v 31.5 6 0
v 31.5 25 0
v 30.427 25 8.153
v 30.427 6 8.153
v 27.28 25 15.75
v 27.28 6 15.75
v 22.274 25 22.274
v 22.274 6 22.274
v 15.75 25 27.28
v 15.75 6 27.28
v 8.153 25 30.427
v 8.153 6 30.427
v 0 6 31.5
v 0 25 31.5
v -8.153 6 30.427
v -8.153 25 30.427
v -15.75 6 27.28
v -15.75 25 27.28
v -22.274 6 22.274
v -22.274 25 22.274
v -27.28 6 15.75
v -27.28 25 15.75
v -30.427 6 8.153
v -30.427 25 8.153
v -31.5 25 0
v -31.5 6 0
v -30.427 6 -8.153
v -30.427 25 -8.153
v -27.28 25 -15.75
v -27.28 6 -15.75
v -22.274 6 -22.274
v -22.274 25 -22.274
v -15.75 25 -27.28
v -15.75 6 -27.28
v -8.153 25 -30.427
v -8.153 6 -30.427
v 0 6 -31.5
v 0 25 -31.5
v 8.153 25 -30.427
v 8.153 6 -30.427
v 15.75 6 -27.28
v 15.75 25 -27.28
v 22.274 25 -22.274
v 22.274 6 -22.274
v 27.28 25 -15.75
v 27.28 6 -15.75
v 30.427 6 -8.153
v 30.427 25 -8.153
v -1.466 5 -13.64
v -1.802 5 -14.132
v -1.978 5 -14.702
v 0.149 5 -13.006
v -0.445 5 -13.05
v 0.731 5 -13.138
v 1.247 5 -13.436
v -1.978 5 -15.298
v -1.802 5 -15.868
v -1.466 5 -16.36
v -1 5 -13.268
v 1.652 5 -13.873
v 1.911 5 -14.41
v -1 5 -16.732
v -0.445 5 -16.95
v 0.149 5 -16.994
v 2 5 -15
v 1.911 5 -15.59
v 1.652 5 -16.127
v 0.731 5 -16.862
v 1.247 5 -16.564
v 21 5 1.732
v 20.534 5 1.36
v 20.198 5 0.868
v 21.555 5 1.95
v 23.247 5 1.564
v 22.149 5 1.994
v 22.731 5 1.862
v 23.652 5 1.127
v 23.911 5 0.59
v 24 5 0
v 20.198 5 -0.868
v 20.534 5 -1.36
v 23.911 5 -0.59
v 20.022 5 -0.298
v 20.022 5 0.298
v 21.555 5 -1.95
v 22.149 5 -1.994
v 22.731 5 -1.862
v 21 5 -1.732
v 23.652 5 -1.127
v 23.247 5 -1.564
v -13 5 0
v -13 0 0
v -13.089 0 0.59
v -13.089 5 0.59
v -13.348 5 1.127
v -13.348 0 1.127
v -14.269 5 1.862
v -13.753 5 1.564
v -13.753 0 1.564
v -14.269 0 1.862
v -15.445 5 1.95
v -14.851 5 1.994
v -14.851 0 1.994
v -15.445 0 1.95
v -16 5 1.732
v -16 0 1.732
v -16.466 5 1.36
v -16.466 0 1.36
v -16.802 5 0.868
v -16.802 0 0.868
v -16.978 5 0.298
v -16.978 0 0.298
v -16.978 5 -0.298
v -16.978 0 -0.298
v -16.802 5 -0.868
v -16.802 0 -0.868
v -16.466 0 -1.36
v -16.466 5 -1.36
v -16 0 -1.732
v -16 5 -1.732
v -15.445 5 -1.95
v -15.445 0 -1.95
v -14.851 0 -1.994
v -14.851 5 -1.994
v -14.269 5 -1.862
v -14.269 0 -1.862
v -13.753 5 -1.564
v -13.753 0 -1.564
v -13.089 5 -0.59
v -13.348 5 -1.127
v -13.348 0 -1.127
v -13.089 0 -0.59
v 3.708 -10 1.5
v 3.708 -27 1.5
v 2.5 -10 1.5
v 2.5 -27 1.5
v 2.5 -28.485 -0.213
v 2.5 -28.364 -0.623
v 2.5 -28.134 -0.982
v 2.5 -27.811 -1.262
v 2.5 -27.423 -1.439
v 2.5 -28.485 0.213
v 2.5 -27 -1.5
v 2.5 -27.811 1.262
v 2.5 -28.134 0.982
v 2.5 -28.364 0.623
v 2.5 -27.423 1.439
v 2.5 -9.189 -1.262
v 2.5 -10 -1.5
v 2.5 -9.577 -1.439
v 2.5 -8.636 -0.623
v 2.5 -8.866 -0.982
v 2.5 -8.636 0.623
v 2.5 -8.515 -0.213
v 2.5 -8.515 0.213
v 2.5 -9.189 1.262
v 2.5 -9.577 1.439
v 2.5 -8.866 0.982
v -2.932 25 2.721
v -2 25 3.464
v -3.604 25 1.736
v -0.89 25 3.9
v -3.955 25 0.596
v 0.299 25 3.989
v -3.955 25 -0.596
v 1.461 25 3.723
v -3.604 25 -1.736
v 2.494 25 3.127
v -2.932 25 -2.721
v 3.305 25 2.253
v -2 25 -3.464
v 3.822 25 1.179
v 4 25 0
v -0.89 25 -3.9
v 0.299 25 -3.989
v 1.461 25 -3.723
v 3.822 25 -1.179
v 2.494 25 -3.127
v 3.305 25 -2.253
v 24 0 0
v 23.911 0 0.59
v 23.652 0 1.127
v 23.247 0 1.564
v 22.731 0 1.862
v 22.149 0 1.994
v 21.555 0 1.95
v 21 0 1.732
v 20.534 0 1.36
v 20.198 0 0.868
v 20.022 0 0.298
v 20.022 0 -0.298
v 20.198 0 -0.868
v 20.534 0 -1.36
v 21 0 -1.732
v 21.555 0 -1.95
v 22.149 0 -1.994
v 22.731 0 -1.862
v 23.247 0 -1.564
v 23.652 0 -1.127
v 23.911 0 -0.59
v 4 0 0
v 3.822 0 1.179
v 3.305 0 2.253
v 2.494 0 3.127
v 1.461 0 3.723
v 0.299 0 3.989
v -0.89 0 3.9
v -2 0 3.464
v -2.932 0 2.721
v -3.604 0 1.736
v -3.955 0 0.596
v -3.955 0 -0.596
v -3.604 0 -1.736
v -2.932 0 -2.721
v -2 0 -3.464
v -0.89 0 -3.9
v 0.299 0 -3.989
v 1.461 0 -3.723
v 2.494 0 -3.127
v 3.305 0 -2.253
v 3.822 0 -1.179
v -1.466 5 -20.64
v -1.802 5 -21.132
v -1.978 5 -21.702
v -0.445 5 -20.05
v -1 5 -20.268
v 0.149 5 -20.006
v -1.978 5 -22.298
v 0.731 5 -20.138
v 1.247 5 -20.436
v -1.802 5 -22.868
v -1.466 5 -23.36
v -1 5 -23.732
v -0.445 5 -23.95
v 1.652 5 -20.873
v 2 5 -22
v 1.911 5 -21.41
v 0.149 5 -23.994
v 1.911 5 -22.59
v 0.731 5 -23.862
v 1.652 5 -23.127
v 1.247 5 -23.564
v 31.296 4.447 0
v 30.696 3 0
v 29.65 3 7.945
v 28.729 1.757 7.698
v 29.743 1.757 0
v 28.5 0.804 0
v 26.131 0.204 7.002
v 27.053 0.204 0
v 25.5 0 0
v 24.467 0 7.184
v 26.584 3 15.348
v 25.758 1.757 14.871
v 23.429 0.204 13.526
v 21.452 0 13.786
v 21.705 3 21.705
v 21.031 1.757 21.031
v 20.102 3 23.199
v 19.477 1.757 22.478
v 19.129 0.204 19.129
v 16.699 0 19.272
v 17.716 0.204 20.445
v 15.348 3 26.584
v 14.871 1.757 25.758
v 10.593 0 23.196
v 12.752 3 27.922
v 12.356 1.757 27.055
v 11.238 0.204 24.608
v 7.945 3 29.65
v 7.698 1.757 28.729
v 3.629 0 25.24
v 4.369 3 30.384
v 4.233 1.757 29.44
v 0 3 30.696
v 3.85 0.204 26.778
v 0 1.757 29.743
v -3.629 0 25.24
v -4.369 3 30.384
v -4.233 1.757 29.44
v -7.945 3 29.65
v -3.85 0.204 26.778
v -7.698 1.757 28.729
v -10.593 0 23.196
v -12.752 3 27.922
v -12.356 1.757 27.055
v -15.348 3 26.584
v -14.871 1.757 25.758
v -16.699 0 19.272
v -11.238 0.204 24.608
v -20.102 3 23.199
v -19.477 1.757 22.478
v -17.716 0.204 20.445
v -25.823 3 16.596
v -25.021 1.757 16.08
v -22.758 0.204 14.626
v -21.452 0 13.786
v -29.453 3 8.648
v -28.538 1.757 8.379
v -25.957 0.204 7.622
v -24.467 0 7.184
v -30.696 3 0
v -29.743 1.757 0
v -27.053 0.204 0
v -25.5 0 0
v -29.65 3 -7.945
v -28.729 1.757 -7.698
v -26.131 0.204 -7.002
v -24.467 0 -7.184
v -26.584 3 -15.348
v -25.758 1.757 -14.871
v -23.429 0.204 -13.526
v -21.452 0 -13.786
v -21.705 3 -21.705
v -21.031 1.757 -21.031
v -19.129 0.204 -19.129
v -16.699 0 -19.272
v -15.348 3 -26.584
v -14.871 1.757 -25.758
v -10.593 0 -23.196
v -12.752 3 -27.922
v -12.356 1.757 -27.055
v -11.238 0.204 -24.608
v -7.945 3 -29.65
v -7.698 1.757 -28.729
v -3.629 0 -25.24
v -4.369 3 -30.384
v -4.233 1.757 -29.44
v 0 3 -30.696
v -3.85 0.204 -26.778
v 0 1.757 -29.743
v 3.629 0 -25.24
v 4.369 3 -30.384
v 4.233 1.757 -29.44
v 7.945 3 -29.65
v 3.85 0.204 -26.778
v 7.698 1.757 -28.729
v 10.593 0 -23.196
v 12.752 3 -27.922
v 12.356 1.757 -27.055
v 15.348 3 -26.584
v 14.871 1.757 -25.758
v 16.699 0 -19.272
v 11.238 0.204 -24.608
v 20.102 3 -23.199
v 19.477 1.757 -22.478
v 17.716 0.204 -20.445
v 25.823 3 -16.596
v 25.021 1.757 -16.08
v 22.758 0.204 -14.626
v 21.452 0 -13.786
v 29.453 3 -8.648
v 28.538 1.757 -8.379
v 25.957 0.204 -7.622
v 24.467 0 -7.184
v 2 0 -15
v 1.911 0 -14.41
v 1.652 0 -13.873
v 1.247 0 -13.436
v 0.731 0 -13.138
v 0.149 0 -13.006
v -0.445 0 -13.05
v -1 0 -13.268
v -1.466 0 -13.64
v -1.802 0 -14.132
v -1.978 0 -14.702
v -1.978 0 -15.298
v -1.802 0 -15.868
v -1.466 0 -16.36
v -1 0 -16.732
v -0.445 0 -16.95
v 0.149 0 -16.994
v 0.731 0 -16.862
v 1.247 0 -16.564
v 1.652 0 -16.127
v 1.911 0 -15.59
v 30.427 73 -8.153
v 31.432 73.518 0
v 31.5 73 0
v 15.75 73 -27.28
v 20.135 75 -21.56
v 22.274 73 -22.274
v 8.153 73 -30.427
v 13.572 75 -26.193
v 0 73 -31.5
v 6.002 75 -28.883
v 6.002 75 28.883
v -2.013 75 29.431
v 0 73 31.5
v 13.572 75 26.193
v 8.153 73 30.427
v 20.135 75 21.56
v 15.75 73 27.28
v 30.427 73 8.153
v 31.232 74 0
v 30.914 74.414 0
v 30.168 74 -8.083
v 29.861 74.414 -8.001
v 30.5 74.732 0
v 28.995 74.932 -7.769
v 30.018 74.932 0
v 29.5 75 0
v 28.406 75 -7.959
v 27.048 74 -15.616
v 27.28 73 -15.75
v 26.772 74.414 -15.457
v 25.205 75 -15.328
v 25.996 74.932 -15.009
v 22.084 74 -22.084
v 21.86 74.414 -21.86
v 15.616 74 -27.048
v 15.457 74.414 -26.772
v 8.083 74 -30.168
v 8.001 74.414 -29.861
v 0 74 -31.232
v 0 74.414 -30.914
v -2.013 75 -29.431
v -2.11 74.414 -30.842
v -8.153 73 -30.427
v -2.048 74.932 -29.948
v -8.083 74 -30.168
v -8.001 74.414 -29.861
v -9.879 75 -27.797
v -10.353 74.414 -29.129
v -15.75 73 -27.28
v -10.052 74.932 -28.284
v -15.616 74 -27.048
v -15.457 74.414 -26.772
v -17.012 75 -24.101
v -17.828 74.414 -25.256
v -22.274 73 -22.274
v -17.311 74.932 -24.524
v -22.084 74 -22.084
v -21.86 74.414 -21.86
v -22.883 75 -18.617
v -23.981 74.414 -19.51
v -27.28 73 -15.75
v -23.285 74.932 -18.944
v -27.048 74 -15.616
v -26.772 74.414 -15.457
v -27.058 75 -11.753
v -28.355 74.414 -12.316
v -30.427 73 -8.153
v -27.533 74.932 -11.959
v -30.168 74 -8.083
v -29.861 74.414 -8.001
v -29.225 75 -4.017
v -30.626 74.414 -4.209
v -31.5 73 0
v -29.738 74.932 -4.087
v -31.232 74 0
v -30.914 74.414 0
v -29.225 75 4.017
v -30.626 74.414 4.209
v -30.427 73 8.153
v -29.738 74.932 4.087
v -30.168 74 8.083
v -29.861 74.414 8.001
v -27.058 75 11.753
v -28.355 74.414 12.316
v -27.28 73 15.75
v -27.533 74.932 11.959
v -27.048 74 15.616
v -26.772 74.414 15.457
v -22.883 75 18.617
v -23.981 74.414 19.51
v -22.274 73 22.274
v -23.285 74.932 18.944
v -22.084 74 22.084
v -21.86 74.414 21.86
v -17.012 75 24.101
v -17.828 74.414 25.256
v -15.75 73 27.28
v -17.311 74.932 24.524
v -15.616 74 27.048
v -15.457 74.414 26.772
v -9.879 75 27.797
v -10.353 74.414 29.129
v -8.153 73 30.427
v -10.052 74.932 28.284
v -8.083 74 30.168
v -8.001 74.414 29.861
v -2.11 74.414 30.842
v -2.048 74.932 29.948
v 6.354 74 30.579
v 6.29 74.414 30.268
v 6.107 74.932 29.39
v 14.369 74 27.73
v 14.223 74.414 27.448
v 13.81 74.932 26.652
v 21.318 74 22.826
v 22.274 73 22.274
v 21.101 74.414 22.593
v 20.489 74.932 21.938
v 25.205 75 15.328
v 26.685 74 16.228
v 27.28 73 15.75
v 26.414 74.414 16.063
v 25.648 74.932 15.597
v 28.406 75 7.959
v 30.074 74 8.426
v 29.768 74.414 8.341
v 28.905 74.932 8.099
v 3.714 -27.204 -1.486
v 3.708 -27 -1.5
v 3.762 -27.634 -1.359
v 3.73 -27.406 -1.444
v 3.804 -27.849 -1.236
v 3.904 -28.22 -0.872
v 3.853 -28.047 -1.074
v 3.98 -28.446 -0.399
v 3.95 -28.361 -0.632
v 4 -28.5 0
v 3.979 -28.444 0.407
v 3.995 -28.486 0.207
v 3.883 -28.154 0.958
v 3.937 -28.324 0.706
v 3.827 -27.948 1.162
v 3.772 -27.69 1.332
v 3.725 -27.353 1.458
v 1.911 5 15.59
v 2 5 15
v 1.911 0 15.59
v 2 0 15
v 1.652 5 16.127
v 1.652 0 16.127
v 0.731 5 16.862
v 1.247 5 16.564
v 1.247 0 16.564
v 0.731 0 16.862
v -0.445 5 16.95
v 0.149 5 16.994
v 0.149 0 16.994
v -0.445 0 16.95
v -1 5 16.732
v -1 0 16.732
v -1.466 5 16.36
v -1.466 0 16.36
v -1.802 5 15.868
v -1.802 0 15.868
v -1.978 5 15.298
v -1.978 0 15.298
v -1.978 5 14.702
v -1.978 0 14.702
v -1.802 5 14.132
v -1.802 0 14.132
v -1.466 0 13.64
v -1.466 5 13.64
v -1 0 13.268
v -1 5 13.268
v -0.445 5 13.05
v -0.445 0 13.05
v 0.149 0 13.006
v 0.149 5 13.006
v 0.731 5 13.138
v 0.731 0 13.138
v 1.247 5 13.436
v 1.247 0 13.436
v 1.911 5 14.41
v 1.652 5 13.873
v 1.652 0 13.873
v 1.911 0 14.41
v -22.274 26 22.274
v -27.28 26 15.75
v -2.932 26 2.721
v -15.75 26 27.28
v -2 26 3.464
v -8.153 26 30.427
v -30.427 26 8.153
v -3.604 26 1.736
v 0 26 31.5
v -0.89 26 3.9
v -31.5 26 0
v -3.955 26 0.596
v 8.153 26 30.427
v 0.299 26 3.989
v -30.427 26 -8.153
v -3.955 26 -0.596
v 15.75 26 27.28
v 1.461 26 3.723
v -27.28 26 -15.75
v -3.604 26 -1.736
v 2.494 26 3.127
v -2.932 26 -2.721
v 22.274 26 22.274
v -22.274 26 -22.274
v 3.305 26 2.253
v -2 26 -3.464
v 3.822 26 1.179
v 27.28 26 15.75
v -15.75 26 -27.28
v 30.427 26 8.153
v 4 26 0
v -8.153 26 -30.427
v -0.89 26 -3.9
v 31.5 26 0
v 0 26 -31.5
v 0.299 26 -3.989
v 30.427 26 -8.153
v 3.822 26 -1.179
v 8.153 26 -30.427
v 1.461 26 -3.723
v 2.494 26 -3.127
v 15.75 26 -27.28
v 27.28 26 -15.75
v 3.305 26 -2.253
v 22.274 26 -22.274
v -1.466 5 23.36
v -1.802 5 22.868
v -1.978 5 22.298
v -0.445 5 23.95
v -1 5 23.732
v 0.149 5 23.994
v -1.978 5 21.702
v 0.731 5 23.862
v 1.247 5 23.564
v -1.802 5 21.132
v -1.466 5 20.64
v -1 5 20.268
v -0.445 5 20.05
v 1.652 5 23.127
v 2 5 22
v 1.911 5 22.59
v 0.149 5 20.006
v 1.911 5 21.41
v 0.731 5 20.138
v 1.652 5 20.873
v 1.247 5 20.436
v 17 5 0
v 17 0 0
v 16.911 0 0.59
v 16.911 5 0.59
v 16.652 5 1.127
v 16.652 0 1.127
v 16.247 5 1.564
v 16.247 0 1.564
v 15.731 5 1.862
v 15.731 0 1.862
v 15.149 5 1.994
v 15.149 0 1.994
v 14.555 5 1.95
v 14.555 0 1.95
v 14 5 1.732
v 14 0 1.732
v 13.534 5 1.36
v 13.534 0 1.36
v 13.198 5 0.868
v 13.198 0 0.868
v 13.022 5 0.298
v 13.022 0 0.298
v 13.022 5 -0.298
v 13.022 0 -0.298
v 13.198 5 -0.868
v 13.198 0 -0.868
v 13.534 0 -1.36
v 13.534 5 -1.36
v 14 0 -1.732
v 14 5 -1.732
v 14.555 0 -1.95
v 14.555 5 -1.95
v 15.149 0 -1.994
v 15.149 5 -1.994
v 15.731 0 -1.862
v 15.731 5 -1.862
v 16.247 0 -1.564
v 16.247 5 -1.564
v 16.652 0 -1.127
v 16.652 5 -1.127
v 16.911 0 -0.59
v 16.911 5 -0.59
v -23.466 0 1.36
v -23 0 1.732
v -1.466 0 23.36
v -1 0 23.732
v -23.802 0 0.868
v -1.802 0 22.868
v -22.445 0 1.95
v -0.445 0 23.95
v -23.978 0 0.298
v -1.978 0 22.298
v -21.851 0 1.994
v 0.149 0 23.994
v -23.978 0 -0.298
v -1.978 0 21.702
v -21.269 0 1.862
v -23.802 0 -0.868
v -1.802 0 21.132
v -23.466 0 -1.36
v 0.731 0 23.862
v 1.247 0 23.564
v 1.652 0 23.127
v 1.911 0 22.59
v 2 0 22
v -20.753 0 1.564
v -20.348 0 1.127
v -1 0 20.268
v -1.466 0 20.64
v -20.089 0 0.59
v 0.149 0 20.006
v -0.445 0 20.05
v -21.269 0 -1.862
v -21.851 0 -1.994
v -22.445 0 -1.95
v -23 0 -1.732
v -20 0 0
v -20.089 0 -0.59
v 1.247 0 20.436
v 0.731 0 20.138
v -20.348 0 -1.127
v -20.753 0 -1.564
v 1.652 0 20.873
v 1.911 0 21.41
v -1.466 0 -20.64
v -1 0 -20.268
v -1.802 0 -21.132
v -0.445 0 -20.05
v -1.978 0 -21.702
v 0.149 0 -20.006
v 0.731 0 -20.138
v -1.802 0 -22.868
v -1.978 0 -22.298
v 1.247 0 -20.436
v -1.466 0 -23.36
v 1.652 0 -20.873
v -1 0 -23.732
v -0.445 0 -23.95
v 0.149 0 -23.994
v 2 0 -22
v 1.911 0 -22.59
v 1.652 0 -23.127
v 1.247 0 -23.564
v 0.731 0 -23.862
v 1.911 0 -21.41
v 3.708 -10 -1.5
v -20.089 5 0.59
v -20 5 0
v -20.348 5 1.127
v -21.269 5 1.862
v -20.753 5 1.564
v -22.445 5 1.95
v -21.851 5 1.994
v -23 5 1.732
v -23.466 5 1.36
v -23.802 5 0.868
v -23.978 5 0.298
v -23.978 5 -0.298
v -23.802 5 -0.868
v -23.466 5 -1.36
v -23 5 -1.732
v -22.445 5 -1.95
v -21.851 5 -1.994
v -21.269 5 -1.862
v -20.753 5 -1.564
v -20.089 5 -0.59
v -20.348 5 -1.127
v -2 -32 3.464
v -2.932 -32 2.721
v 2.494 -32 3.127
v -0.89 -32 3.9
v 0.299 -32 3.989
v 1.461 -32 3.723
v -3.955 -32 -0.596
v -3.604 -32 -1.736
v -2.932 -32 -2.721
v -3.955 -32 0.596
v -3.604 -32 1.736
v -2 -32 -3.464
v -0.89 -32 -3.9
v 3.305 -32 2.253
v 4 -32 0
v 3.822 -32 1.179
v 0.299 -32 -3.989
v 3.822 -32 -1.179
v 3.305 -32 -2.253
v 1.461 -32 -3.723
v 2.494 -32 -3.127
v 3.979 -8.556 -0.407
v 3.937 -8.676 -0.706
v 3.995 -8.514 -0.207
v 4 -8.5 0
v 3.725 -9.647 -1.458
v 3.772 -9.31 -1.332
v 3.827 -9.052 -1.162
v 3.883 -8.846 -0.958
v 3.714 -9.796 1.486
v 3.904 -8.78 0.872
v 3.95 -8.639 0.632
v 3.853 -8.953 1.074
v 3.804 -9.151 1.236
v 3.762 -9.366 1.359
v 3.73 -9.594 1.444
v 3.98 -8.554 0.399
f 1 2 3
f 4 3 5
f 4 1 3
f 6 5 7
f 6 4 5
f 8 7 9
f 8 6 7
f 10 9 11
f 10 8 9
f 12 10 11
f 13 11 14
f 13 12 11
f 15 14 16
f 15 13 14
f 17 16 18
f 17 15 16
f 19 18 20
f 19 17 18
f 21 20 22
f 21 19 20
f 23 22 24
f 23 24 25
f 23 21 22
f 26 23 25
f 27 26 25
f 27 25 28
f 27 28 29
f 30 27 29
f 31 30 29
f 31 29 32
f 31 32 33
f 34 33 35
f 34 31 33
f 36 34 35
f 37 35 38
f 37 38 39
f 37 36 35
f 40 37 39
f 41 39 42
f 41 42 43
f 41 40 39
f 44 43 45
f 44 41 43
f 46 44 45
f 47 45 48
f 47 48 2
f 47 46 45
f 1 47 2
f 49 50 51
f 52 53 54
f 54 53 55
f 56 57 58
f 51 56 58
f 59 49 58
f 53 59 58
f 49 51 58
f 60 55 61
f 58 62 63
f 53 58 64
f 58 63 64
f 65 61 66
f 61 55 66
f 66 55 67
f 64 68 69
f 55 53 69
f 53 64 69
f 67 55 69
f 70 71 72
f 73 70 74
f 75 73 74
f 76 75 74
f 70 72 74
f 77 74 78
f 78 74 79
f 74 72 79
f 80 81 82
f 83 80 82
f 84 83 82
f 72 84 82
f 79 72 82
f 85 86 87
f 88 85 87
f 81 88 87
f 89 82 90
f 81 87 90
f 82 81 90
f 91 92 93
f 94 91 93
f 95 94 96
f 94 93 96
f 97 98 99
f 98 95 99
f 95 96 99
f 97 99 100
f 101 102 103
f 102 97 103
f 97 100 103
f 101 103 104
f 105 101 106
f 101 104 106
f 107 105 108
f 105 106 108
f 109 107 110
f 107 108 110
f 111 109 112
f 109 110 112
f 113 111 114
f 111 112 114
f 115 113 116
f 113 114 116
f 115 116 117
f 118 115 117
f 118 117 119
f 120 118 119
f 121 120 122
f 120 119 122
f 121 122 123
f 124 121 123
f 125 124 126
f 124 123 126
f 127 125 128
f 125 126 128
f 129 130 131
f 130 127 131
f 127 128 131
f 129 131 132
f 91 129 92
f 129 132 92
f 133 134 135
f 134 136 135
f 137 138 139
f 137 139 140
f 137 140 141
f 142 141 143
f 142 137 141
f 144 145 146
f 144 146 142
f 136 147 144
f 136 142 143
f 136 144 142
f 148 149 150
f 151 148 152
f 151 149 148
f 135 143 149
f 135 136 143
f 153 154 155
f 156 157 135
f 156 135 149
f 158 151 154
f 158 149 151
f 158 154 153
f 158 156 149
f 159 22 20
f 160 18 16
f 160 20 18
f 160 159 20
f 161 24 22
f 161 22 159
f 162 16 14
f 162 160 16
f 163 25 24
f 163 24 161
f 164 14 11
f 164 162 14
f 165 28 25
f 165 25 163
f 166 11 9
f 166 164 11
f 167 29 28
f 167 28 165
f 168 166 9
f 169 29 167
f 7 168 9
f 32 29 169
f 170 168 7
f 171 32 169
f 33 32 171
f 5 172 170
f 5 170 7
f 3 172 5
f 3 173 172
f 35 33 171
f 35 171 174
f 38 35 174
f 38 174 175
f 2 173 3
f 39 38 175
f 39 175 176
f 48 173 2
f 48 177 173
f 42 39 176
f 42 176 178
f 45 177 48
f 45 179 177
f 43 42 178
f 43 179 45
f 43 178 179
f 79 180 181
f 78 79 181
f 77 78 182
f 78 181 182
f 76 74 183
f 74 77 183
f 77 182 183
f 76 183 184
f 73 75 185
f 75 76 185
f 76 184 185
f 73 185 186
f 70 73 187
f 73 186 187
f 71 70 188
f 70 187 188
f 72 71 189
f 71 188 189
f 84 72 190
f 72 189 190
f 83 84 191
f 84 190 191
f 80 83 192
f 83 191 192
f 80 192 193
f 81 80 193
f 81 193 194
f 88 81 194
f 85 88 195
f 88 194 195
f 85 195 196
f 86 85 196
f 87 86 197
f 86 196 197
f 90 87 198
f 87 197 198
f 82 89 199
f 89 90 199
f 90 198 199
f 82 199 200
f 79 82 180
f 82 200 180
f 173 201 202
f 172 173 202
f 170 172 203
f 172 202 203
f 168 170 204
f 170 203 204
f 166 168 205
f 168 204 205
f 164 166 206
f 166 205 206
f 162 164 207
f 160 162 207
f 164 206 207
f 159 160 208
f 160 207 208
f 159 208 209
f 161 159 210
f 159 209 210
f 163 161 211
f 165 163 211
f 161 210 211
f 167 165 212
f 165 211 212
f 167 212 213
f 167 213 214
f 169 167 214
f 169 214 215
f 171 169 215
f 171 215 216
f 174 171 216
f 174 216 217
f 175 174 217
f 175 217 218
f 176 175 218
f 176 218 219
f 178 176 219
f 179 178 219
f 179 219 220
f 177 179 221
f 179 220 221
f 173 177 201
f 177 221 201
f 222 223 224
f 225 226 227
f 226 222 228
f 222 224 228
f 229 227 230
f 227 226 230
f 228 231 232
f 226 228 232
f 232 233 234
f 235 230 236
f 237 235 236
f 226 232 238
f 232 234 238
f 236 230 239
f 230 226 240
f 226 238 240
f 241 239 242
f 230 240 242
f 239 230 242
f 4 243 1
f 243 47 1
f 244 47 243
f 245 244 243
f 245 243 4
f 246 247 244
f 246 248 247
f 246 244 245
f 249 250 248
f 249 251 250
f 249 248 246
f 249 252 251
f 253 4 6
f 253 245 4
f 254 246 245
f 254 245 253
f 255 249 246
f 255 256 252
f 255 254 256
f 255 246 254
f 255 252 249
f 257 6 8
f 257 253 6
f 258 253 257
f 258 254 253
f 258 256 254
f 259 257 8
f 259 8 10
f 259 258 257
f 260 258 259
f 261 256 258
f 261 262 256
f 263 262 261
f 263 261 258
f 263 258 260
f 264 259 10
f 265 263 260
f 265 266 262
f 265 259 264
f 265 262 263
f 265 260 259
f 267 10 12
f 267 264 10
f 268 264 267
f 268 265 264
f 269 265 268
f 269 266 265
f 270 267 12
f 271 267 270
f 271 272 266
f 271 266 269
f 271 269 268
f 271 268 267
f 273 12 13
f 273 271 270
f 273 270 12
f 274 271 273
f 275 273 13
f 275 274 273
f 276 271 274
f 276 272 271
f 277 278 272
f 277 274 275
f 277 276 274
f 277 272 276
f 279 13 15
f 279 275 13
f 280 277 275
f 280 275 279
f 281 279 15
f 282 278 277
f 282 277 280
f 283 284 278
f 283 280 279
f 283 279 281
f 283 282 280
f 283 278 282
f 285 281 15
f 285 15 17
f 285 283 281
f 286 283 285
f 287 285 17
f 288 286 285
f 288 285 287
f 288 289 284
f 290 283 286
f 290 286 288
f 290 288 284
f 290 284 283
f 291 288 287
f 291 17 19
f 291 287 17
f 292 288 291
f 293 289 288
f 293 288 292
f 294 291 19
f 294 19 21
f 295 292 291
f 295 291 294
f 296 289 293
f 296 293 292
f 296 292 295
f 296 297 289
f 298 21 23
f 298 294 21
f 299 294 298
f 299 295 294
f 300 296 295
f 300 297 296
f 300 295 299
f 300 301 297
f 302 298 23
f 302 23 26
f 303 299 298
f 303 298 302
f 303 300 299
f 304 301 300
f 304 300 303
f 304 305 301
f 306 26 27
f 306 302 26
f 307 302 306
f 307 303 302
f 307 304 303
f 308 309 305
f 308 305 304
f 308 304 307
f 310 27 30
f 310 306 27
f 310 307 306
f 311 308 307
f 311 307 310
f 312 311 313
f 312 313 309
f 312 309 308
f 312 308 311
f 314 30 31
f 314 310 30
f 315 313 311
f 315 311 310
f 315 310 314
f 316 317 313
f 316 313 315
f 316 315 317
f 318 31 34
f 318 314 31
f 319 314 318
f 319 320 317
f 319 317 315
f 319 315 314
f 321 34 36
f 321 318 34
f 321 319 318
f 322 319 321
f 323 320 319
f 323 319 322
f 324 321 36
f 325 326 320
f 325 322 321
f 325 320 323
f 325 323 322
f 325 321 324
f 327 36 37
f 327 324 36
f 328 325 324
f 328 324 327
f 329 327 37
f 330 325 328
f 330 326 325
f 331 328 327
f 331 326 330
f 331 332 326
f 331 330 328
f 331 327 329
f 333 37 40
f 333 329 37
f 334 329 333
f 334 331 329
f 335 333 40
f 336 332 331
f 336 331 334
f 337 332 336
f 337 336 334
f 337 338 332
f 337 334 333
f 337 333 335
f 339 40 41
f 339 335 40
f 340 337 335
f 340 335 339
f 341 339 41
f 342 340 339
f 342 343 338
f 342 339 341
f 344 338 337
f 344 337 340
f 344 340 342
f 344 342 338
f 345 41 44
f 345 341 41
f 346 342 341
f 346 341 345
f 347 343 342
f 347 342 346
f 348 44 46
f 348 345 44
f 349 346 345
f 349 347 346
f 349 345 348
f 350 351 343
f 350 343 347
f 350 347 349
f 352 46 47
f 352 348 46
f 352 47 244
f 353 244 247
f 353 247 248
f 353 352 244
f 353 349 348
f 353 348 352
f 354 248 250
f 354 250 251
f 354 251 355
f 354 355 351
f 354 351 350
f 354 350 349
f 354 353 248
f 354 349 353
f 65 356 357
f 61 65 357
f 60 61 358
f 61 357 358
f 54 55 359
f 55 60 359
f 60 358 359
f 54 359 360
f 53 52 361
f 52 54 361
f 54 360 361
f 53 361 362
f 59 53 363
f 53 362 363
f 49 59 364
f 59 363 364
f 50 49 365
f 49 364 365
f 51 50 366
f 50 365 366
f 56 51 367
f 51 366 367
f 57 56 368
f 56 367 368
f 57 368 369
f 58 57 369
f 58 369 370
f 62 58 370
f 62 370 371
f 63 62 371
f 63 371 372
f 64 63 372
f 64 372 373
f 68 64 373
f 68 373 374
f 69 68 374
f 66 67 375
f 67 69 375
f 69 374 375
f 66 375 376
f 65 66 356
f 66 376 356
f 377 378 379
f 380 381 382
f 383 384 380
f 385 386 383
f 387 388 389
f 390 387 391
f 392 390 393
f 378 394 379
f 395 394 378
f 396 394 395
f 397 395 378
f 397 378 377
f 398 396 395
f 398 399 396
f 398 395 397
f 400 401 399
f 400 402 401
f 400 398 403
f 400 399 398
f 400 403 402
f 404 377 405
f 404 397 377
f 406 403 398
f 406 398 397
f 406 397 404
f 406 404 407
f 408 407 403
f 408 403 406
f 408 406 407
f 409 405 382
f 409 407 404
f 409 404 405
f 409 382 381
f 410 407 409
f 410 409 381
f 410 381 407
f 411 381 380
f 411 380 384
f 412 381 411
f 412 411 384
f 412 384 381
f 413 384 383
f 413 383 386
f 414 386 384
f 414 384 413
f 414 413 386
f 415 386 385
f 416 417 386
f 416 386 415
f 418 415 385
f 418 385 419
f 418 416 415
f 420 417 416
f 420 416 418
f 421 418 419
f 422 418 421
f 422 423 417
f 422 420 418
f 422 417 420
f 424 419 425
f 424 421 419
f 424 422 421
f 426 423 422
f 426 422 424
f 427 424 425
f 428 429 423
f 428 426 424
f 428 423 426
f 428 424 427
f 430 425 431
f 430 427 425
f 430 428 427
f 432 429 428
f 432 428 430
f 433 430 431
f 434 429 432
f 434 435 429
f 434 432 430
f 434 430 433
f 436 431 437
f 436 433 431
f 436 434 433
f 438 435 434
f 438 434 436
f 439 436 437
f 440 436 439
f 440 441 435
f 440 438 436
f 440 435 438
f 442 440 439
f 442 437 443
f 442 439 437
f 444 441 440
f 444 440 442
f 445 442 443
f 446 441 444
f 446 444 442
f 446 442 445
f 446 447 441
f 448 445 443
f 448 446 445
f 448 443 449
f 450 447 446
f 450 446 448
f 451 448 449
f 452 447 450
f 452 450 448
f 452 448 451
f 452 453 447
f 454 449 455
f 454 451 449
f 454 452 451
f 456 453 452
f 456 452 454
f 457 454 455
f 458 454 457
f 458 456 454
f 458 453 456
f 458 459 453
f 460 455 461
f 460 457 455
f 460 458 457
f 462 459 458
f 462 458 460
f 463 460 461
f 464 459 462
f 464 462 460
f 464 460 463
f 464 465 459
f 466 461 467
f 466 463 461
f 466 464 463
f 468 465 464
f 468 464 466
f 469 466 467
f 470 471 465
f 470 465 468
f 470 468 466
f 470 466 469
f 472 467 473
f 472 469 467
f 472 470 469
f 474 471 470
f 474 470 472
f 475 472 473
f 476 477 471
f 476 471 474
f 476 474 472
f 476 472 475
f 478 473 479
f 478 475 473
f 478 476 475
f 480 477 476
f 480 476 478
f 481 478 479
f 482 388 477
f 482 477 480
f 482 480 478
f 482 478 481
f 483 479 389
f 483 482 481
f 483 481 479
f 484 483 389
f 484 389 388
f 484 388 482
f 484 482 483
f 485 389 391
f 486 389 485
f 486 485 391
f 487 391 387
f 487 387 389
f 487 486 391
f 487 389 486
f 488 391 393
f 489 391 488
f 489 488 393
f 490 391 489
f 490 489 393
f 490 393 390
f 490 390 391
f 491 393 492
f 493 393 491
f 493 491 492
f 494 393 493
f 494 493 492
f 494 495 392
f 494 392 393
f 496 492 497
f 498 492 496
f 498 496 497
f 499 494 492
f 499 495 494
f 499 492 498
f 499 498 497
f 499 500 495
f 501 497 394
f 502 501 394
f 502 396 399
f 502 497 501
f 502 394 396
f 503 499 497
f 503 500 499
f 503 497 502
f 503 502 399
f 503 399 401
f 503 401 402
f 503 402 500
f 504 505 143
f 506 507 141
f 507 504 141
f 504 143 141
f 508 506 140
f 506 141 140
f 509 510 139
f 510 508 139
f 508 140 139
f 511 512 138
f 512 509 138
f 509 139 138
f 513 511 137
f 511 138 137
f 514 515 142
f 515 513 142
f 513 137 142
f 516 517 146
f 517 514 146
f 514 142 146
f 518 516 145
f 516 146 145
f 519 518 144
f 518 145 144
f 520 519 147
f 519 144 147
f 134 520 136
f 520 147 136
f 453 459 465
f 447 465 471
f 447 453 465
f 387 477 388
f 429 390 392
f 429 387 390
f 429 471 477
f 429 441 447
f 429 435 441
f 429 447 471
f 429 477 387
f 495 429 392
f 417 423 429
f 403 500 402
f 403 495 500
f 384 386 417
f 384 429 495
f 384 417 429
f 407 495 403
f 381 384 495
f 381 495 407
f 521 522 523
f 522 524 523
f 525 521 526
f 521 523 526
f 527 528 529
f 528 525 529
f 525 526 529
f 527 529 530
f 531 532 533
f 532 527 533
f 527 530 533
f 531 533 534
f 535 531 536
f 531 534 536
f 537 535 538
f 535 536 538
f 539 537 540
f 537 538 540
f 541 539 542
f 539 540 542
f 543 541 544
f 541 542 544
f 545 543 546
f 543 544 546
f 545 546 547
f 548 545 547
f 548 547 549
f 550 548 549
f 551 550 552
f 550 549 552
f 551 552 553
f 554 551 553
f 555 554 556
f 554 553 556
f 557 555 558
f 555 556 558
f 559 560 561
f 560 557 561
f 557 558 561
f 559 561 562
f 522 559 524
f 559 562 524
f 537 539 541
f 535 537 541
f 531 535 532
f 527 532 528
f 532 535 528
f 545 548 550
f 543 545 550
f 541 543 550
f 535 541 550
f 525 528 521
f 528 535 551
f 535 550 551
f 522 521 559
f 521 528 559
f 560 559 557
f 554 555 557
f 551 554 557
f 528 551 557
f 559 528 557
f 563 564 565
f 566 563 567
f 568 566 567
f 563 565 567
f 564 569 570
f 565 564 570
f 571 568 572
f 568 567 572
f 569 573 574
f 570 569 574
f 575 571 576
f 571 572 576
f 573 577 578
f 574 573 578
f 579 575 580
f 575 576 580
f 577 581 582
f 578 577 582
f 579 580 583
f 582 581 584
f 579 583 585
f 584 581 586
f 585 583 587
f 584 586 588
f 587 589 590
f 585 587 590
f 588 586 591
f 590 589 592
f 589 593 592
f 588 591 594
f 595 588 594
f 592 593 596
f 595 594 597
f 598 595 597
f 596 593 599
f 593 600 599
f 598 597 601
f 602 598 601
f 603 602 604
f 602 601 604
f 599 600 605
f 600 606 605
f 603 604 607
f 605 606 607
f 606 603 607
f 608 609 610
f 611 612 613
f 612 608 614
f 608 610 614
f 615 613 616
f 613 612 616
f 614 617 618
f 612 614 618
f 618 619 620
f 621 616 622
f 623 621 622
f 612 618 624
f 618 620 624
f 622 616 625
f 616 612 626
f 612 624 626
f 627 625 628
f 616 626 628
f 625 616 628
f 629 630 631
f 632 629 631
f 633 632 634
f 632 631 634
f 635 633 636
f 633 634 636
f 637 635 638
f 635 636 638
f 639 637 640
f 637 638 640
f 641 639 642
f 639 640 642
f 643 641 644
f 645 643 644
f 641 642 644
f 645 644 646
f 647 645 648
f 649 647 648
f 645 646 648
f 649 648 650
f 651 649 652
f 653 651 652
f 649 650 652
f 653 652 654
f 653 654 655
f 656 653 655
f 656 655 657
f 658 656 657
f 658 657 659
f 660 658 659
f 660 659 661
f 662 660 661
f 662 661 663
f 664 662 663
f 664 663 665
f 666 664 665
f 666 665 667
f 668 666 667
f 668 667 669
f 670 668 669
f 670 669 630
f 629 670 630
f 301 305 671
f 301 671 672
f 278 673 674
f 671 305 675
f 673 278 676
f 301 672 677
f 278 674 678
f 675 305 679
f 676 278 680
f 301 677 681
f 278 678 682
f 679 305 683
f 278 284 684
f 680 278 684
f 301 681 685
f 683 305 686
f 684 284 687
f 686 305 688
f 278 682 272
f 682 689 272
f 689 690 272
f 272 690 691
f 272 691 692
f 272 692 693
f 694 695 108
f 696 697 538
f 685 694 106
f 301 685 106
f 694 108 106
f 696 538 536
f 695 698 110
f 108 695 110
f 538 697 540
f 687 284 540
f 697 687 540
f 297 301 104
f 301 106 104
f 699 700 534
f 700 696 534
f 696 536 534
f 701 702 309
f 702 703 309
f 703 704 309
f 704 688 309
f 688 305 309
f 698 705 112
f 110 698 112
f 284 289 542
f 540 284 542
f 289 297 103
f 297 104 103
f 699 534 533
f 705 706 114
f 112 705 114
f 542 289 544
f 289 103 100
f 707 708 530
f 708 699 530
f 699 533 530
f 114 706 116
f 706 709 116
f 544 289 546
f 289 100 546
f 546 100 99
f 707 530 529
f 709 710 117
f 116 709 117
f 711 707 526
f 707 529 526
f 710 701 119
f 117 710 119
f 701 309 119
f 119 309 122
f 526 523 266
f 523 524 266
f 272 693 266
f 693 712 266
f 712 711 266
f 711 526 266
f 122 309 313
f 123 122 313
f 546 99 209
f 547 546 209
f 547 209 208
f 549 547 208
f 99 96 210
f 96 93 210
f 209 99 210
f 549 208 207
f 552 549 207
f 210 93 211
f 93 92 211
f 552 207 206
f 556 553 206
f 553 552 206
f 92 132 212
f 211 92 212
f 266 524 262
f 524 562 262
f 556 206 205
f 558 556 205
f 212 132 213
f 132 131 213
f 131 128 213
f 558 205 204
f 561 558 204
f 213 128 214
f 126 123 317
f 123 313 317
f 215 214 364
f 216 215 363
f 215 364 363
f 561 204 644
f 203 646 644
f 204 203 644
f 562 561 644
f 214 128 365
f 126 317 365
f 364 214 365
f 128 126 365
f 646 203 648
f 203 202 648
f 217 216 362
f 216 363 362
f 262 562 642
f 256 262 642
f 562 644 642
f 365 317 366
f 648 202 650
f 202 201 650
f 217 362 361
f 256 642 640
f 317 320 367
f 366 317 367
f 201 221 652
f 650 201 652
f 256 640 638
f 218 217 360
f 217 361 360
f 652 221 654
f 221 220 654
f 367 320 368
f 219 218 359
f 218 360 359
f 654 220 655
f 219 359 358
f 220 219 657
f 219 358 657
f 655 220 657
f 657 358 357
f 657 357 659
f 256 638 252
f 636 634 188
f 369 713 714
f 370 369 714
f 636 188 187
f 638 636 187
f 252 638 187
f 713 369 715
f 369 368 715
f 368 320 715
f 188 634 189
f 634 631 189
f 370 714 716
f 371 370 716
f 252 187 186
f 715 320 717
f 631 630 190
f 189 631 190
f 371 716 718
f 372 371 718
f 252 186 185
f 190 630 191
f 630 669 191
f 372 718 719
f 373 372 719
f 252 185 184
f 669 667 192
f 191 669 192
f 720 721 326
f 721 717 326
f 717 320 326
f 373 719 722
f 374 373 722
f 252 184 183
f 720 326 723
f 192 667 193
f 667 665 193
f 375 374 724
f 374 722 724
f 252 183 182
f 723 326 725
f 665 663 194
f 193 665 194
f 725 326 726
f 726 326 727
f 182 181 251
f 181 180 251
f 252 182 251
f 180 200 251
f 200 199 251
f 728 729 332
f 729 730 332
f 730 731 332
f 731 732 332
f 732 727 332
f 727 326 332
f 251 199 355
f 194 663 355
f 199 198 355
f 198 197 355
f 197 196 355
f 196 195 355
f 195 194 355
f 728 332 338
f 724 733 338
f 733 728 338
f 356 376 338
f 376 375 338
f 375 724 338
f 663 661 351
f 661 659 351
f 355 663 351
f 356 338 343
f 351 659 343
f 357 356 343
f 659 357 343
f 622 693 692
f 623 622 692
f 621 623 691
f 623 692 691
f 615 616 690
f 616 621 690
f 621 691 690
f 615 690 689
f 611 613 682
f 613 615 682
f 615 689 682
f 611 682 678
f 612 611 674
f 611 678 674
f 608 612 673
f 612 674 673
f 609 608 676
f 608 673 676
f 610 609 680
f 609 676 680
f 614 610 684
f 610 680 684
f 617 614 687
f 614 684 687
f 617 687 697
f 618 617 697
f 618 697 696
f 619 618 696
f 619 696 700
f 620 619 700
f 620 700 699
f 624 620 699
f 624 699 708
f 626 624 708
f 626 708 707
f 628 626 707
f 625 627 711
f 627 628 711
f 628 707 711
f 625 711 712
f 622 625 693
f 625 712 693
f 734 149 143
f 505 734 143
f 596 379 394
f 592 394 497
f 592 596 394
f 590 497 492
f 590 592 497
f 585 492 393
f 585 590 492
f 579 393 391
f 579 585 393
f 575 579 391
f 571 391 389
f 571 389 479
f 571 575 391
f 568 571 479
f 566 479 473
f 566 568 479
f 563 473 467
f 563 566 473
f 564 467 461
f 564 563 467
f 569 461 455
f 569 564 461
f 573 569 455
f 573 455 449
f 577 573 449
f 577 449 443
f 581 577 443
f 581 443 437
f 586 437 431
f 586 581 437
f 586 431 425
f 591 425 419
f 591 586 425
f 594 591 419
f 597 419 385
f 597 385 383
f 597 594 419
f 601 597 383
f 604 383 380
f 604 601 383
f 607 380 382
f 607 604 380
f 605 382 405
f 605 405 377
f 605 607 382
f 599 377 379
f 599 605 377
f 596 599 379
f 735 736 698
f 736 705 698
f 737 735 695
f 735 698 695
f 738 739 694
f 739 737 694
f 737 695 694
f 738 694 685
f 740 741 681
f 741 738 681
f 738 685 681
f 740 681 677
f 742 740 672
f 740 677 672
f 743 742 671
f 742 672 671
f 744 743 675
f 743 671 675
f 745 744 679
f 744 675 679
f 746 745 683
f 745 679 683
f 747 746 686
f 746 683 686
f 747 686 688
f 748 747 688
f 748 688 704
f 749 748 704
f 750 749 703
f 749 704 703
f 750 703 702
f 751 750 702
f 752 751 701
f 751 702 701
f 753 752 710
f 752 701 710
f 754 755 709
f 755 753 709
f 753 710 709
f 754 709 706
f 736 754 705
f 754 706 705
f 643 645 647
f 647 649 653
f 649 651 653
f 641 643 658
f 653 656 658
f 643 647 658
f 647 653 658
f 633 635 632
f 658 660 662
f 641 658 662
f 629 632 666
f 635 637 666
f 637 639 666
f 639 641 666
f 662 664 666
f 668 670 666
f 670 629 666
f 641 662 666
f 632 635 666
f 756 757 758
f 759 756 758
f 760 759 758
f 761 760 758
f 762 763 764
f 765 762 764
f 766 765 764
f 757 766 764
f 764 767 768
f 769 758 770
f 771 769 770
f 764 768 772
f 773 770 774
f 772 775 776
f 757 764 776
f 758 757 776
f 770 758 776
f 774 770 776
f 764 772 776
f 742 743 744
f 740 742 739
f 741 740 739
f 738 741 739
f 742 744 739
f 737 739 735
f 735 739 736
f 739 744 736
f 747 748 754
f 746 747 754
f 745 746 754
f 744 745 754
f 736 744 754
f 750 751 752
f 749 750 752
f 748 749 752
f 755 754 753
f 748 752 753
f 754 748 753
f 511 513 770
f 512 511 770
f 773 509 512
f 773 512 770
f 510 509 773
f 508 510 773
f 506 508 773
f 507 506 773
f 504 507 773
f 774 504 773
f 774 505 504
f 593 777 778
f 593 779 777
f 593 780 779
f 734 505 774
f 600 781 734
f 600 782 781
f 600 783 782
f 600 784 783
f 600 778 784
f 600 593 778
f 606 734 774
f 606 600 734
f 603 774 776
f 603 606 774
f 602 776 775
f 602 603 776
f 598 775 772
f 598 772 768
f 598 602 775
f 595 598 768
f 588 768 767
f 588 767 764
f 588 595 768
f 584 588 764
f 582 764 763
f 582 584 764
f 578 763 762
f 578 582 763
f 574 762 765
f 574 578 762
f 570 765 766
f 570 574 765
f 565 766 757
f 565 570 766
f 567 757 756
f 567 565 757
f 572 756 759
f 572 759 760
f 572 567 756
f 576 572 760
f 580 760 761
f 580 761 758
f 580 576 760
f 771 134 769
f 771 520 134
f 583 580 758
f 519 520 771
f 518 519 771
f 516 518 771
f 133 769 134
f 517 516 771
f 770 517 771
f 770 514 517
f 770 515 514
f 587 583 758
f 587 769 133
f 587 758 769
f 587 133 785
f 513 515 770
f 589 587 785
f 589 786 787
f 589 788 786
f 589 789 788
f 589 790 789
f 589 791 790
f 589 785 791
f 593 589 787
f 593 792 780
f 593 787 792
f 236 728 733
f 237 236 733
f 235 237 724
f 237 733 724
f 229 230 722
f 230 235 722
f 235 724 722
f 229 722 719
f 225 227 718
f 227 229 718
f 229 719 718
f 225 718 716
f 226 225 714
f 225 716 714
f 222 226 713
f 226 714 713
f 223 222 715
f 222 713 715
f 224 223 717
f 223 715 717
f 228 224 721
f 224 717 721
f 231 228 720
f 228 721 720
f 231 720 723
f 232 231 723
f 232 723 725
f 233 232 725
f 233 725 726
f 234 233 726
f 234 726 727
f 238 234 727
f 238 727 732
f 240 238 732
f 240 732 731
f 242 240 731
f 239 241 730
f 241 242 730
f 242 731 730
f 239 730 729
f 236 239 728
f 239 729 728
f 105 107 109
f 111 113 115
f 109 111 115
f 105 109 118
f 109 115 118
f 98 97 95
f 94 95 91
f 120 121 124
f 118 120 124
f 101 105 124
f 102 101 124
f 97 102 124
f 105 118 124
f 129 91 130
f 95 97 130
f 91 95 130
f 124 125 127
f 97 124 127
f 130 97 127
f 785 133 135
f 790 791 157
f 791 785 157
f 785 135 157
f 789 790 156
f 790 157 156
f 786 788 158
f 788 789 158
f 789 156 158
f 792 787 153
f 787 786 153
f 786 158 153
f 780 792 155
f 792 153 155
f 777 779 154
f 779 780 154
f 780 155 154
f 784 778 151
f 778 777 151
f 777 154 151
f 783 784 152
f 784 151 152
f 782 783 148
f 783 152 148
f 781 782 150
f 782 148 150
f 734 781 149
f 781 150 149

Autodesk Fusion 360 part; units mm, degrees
sketch "FlipskyFrontSketch" plane through (0, 0, 0) normal (0, 1, 0) x (1, 0, 0) in component "FlipskyR6374"
  circle A0 centre (0, 0) radius 22 construction
  circle A1 centre (0, 0) radius 31.5
  circle A2 centre (0, 0) radius 15 construction
  circle A3 centre (0, 0) radius 4
  line L0 (0, -40.5211) -> (0, 42) construction
  line L1 (-68.5254, 0) -> (76.0881, 0) construction
  circle A4 centre (0, -22) radius 2
  circle A5 centre (0, -15) radius 2
  circle A6 centre (0, 22) radius 2
  circle A7 centre (0, 15) radius 2
  circle A8 centre (-15, 0) radius 2
  circle A9 centre (-22, 0) radius 2
  circle A10 centre (15, 0) radius 2
  circle A11 centre (22, 0) radius 2
  line L2 (3.7081, -1.5) -> (2.5, -1.5)
  line L3 (2.5, -1.5) -> (2.5, 1.5)
  line L4 (2.5, 1.5) -> (3.7081, 1.5)
  line L5 (60, 20) -> (60, -20)
  line L6 (-60, -20) -> (-60, 20)
  line L7 (-60, 20) -> (60, -20) construction
  line L8 (60, 20) -> (-60, -20) construction
  line L9 (-28.1114, -20) -> (-60, -20)
  line L10 (60, -20) -> (28.1114, -20)
  line L11 (-60, 20) -> (-28.1114, 20)
  line L12 (28.1114, 20) -> (60, 20)
  circle A12 centre (-50, -10) radius 2.5
  circle A13 centre (-50, 10) radius 2.5
  circle A14 centre (50, -10) radius 2.5
  circle A15 centre (50, 10) radius 2.5
  line L13 (-63.5493, -10) -> (64.0522, -10) construction
  line L14 (-62.7711, 10) -> (65, 10) construction
  line L15 (-50, -26.3815) -> (-50, 24.1685) construction
  line L16 (50, -27.289) -> (50, 25) construction
  line L17 (16.7321, 1) -> (14.9666, 1)
  line L18 (2.5, -1) -> (3, -1)
  line L19 (-40, -20) -> (-40, 20)
  line L20 (40, -20) -> (40, 20)
  arc A16 (-28.1114, -20) -> (28.1114, -20) centre (0, 0) ccw
  arc A17 (28.1114, 20) -> (-28.1114, 20) centre (0, 0) ccw
  circle A18 centre (0, 0) radius 10
  circle A19 centre (0, 0) radius 5
  line L21 (0, 0) -> (-31.8198, -31.8198) construction
  line L22 (0, 0) -> (45, 0) construction
  line L23 (-16.2768, -30.419) -> (-14.0506, -28.1927)
  line L24 (-34.1421, -20) -> (-28.1927, -14.0506)
  dimension "d1" = 44
  dimension "d2" = 63
  dimension "d3" = 30
  dimension "d4" = 8
  dimension "d6" = 4
  dimension "d7" = 4
  dimension "d8" = 4
  dimension "d9" = 4
  dimension "d10" = 4
  dimension "d11" = 4
  dimension "d12" = 4
  dimension "d13" = 4
  dimension "d28" = 1.5
  dimension "d29" = 1.5
  dimension "d30" = 2.5
  dimension "d35" = 120
  dimension "d36" = 40
  dimension "d48" = 5
  dimension "d49" = 5
  dimension "d50" = 5
  dimension "d51" = 5
  dimension "d52" = 10
  dimension "d53" = 10
  dimension "d54" = 10
  dimension "d55" = 10
  dimension "d66" = 20
  dimension "d67" = 20
  dimension "d68" = 34.5
  dimension "d71" = 20
  dimension "d72" = 10
  dimension "d73" = 135
  dimension "d75" = 10
  dimension "d76" = 10
extrude "Extrude1" add sketch "FlipskyFrontSketch" along normal blind 25 contours A1 | A4 | A5 | A6 | A7 | A8 | A9 | A10 | A11 | A18 | A19 makes body 1 in component "Stator"
extrude "Extrude2" cut sketch "FlipskyFrontSketch" along normal blind 5 contours A4 | A5 | A6 | A7 | A8 | A9 | A10 | A11 bodies 1 in component "Stator"
fillet "Fillet1" radius 6 1 edges at (-29.3683, 0, 11.3909) on bodies 1 in component "Stator"
sketch "AxleRightSketch" plane through (0, 0, 0) normal (1, 0, 0) x (0, 1, 0) in component "Rotor"
  line L0 (-27, 1.5) -> (-10, 1.5)
  line L1 (-10, -1.5) -> (-27, -1.5)
  line L2 (-35, 0) -> (6.0427, 0) construction
  line L3 (-32, 10) -> (-32, -10) construction
  line L4 (0, -20) -> (0, 20)
  arc A0 (-27, 1.5) -> (-27, -1.5) centre (-27, 0) ccw
  arc A1 (-10, -1.5) -> (-10, 1.5) centre (-10, 0) ccw
  dimension "d92" = 3
  dimension "d93" = 3
  dimension "d94" = 17
  dimension "d95" = 10
extrude "Extrude1'" add sketch "FlipskyFrontSketch" along normal blind -32 and the other way blind -74 separate body contours A3 L2 L3 L4 | A3 L2 L3 L4 makes body 2 in component "Rotor"
extrude "Extrude5" add sketch "FlipskyFrontSketch" along normal blind 75 and the other way blind -26 contours A1 | A3 L2 L3 L4 | A3 L2 L3 L4 | A4 | A5 | A6 | A7 | A8 | A9 | A10 | A11 | A18 | A19 bodies 2 in component "Rotor"
fillet "Fillet1'" radius 2 1 edges at (-29.3683, 75, 11.3909) on bodies 2 in component "Rotor"
extrude "Extrude2'" cut sketch "AxleRightSketch" along normal blind 15 and the other way blind -2.5 bodies 2 in component "Rotor"
component "FlipskyR6374" placed x (1, 0, 0) y (0, 1, 0) z (0, 0, 1) at (0, 0, 0)
component "Flipsky6374" placed x (1, 0, 0) y (0, 1, 0) z (0, 0, 1) at (0, 0, 0) in component "FlipskyR6374"
component "Stator" placed x (1, 0, 0) y (0, 1, 0) z (0, 0, 1) at (0, 0, 0) in component "Flipsky6374"
component "Rotor" placed x (1, 0, 0) y (0, 1, 0) z (0, 0, 1) at (0, 0, 0) in component "Flipsky6374"
